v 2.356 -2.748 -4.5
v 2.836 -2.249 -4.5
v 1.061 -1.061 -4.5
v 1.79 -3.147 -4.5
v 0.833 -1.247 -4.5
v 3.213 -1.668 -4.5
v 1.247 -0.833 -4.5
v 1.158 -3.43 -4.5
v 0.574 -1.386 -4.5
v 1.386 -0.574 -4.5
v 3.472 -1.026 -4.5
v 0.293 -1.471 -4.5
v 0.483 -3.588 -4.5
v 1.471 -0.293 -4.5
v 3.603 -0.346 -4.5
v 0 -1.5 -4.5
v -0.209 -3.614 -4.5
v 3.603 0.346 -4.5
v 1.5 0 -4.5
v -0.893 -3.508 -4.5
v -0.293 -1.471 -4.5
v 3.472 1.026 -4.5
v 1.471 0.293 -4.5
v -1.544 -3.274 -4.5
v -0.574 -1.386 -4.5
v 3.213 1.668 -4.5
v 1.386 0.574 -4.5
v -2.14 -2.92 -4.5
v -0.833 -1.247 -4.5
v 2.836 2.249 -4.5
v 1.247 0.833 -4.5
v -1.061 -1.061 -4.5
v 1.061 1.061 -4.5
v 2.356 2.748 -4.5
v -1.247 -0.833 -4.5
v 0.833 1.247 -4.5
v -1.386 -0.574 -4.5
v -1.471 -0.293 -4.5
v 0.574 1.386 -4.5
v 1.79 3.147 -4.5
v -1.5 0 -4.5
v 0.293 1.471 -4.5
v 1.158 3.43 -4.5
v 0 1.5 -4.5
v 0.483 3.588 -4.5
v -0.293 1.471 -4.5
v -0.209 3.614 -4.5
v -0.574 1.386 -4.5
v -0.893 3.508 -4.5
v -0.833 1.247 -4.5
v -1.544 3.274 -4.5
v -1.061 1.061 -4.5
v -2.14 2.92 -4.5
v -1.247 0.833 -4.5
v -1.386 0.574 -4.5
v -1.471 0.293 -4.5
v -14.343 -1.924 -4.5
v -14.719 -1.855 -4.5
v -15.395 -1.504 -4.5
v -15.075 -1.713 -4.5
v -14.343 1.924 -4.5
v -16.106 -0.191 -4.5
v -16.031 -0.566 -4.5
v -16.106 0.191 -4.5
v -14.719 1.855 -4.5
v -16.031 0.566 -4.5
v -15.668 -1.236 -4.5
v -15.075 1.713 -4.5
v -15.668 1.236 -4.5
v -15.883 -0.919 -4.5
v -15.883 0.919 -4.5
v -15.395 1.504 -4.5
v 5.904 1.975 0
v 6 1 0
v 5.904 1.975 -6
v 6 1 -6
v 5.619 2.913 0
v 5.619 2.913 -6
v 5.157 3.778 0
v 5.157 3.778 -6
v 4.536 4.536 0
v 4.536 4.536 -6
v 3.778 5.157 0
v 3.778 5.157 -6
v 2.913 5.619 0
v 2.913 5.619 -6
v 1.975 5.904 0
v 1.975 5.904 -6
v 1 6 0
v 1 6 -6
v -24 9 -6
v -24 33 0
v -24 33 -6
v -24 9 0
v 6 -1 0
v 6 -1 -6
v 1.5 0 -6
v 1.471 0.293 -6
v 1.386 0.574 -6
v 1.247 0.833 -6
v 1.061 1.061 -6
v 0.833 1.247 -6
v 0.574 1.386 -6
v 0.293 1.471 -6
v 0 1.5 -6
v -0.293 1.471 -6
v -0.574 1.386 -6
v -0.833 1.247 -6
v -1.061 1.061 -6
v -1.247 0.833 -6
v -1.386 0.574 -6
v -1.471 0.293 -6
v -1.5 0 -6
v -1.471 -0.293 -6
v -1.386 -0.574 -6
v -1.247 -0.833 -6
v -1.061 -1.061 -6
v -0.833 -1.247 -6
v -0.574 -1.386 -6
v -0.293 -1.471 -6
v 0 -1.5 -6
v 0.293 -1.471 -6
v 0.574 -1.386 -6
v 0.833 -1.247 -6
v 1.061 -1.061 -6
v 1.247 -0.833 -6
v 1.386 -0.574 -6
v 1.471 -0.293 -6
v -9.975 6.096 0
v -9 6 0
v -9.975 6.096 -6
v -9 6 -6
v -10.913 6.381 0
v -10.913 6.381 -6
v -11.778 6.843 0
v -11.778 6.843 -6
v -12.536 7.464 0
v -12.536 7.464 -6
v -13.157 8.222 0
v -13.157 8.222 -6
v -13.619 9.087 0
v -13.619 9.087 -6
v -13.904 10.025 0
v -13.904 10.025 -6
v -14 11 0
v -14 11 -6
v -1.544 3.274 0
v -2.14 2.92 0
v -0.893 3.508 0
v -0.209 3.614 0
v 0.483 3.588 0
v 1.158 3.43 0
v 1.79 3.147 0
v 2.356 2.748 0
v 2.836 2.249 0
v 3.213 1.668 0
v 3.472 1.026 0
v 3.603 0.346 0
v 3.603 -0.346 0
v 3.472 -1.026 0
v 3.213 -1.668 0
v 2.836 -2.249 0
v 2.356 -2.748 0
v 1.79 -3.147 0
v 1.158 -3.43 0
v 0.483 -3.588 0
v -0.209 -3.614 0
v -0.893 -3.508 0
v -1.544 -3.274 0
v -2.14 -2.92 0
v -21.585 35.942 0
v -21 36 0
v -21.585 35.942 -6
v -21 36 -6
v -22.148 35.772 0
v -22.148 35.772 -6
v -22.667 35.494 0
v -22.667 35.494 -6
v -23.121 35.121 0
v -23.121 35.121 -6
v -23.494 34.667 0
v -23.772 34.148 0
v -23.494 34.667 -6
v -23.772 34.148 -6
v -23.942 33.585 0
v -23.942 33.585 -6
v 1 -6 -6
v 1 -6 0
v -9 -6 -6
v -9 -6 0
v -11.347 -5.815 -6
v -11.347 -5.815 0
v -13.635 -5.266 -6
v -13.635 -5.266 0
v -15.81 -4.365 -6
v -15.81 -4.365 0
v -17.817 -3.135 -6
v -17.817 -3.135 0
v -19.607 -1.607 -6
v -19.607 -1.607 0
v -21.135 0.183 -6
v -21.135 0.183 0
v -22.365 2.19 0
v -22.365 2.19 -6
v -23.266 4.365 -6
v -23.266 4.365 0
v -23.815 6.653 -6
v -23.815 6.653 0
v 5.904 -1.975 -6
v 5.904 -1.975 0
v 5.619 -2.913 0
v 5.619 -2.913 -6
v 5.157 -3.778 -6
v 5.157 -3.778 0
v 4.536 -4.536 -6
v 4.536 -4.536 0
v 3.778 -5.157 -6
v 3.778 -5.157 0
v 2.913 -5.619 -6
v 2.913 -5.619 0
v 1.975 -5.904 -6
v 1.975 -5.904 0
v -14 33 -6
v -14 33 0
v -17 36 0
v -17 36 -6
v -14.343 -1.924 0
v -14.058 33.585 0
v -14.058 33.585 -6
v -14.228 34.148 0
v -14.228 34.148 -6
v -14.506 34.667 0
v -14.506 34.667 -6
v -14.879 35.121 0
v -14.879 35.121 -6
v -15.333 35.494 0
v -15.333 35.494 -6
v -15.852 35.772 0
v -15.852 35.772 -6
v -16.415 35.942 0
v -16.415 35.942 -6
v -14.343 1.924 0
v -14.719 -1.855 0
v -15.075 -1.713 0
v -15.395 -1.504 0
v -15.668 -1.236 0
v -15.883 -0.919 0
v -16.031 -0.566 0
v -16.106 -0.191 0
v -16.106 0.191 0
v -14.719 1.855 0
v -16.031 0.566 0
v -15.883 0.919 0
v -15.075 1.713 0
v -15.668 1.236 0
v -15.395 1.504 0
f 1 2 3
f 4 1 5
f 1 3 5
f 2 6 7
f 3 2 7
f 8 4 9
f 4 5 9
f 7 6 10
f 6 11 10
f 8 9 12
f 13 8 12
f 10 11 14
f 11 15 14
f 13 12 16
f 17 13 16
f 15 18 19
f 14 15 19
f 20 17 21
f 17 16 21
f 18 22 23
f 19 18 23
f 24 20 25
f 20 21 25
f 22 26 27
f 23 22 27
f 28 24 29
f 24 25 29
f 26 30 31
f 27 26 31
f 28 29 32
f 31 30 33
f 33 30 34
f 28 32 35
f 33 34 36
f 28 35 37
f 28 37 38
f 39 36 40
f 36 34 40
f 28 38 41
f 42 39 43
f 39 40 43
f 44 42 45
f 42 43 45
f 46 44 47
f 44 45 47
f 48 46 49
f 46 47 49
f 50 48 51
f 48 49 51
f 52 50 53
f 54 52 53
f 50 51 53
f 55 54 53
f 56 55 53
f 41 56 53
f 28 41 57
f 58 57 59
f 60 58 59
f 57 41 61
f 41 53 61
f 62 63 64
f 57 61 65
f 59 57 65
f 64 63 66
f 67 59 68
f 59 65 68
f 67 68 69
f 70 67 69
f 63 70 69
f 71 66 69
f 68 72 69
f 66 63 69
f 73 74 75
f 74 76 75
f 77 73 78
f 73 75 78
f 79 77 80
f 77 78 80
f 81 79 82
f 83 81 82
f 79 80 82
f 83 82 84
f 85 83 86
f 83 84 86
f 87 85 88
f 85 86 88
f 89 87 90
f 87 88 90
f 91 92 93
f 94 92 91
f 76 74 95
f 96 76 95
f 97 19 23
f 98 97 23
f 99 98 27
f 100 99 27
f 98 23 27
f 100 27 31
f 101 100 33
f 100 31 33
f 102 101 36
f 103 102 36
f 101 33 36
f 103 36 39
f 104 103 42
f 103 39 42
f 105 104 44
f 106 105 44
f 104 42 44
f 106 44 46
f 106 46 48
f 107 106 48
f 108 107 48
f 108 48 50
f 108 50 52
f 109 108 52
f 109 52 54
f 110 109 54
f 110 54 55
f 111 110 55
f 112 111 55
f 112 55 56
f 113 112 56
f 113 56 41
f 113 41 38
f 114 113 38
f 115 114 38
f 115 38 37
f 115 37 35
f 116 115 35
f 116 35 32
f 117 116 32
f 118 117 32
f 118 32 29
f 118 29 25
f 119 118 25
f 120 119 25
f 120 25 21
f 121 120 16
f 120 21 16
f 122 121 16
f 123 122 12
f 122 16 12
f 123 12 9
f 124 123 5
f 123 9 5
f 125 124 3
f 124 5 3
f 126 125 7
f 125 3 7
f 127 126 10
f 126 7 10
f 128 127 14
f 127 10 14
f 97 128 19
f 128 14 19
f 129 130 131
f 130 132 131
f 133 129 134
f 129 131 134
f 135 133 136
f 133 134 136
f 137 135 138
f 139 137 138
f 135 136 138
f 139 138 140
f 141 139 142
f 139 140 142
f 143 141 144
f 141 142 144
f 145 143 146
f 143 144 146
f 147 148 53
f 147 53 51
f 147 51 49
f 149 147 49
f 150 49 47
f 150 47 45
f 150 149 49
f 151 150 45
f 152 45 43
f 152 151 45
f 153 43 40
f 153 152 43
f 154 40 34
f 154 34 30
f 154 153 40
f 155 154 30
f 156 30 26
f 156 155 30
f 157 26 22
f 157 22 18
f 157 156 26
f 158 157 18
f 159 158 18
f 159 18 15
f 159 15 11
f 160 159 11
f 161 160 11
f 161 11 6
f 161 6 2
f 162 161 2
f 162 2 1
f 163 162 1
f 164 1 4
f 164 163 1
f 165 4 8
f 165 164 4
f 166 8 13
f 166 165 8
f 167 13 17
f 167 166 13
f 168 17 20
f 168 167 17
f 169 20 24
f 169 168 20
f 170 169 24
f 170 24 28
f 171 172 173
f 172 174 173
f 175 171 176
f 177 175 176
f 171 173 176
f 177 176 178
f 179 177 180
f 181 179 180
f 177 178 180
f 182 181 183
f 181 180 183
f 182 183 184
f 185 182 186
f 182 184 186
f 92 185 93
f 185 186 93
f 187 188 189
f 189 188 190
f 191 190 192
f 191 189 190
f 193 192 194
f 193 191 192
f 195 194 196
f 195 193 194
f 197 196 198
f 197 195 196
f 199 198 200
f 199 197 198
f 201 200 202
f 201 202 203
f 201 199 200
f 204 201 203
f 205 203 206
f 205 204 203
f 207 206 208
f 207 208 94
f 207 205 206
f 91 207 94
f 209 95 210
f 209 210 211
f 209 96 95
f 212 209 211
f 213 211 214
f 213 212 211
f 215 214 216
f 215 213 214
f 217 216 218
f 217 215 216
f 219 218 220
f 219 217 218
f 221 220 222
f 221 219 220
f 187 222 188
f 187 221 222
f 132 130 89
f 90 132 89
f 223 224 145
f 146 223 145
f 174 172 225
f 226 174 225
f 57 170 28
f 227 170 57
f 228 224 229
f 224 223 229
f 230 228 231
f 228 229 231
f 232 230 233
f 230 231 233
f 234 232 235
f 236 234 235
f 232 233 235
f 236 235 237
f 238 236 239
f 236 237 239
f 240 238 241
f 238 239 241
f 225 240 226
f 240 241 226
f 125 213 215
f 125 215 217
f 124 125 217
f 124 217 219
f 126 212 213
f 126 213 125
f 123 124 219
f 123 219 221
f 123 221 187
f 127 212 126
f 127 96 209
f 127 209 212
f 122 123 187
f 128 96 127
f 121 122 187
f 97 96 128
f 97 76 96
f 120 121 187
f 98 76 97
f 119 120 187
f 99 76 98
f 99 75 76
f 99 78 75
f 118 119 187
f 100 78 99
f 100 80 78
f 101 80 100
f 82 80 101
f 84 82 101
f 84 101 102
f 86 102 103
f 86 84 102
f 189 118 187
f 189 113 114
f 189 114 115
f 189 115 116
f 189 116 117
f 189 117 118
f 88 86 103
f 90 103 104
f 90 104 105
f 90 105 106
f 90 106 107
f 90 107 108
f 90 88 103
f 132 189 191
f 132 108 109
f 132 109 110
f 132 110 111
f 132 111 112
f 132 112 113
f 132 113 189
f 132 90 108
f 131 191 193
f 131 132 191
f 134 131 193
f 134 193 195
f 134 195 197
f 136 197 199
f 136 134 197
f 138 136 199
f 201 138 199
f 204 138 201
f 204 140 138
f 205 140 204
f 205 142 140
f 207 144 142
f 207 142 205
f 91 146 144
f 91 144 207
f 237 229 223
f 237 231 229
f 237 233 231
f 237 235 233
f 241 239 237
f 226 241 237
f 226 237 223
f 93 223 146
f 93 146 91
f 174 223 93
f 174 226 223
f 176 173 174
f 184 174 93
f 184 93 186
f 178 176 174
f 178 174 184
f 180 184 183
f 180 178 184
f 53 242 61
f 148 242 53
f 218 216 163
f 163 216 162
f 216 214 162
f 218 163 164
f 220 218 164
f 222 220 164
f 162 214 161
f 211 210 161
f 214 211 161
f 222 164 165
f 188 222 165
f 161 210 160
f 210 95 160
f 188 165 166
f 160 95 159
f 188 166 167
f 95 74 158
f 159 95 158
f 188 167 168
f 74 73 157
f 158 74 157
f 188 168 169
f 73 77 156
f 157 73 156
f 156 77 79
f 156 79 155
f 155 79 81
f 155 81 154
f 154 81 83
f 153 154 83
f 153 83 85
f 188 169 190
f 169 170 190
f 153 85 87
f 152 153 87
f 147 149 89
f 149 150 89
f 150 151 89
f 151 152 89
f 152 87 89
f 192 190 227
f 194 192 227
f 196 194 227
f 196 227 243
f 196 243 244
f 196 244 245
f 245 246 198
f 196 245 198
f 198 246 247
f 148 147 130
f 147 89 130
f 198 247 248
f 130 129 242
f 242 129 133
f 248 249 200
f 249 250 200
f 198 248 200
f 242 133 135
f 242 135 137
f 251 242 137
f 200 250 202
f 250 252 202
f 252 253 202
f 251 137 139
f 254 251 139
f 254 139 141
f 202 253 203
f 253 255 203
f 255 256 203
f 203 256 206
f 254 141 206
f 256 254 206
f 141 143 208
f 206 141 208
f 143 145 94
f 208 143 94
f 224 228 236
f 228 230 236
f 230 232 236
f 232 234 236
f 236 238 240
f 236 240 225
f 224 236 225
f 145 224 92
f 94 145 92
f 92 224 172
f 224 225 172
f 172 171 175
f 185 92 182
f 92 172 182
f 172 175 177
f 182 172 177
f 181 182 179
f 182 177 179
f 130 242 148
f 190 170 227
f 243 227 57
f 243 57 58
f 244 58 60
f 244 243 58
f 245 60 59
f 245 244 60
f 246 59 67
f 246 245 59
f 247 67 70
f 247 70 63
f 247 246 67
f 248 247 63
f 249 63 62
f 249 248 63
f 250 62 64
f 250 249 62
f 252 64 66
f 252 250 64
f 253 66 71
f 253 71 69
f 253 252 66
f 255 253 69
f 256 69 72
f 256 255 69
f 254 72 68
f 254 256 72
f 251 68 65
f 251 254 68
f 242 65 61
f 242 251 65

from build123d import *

# Parameters (mm, degrees)
BOSS_EXTRUDE1_DEPTH = 6
FILLET1_R           = 5
FILLET2_R           = 15
FILLET3_R           = 5
FILLET4_R           = 5
FILLET5_R           = 3
FILLET6_R           = 3
CUT_EXTRUDE1_DEPTH  = 4.5
SKETCH3_R           = 1.5
CUT_EXTRUDE2_DEPTH  = 5


with BuildPart() as part:
    # Sketch2 → Boss-Extrude1 (new body)
    with BuildSketch(Plane.XY):
        Polygon((-14, 6), (6, 6), (6, -6), (-24, -6), (-24, 6), (-24, 36), (-14, 36), align=None)
    extrude(amount=-BOSS_EXTRUDE1_DEPTH)

    # Fillet1
    fillet1_edges = [part.edges().sort_by_distance(p)[0] for p in [
        (-14, 6, -3),
    ]]
    fillet(fillet1_edges, radius=FILLET1_R)

    # Fillet2
    fillet2_edges = [part.edges().sort_by_distance(p)[0] for p in [
        (-24, -6, -3),
    ]]
    fillet(fillet2_edges, radius=FILLET2_R)

    # Fillet3
    fillet3_edges = [part.edges().sort_by_distance(p)[0] for p in [
        (6, 6, -3),
    ]]
    fillet(fillet3_edges, radius=FILLET3_R)

    # Fillet4
    fillet4_edges = [part.edges().sort_by_distance(p)[0] for p in [
        (6, -6, -3),
    ]]
    fillet(fillet4_edges, radius=FILLET4_R)

    # Fillet5
    fillet5_edges = [part.edges().sort_by_distance(p)[0] for p in [
        (-14, 36, -3),
    ]]
    fillet(fillet5_edges, radius=FILLET5_R)

    # Fillet6
    fillet6_edges = [part.edges().sort_by_distance(p)[0] for p in [
        (-24, 36, -3),
    ]]
    fillet(fillet6_edges, radius=FILLET6_R)

    # Sketch1 → Cut-Extrude1 (cut)
    with BuildSketch(Plane.XY):
        with BuildLine():
            Line((-14.343060397, 1.923598719), (-2.139626136, 2.92))
            ThreePointArc((-2.139626136, 2.92), (3.62, 0), (-2.139626136, -2.92))
            Line((-2.139626136, -2.92), (-14.343060397, -1.923598719))
            ThreePointArc((-14.343060397, -1.923598719), (-16.116, 0), (-14.343060397, 1.923598719))
        make_face()
    extrude(amount=-CUT_EXTRUDE1_DEPTH, mode=Mode.SUBTRACT)

    # Sketch3 → Cut-Extrude2 (cut)
    with BuildSketch(Plane.XY.offset(-4.5)):
        Circle(SKETCH3_R)
    extrude(amount=-CUT_EXTRUDE2_DEPTH, mode=Mode.SUBTRACT)


solid = part.part
